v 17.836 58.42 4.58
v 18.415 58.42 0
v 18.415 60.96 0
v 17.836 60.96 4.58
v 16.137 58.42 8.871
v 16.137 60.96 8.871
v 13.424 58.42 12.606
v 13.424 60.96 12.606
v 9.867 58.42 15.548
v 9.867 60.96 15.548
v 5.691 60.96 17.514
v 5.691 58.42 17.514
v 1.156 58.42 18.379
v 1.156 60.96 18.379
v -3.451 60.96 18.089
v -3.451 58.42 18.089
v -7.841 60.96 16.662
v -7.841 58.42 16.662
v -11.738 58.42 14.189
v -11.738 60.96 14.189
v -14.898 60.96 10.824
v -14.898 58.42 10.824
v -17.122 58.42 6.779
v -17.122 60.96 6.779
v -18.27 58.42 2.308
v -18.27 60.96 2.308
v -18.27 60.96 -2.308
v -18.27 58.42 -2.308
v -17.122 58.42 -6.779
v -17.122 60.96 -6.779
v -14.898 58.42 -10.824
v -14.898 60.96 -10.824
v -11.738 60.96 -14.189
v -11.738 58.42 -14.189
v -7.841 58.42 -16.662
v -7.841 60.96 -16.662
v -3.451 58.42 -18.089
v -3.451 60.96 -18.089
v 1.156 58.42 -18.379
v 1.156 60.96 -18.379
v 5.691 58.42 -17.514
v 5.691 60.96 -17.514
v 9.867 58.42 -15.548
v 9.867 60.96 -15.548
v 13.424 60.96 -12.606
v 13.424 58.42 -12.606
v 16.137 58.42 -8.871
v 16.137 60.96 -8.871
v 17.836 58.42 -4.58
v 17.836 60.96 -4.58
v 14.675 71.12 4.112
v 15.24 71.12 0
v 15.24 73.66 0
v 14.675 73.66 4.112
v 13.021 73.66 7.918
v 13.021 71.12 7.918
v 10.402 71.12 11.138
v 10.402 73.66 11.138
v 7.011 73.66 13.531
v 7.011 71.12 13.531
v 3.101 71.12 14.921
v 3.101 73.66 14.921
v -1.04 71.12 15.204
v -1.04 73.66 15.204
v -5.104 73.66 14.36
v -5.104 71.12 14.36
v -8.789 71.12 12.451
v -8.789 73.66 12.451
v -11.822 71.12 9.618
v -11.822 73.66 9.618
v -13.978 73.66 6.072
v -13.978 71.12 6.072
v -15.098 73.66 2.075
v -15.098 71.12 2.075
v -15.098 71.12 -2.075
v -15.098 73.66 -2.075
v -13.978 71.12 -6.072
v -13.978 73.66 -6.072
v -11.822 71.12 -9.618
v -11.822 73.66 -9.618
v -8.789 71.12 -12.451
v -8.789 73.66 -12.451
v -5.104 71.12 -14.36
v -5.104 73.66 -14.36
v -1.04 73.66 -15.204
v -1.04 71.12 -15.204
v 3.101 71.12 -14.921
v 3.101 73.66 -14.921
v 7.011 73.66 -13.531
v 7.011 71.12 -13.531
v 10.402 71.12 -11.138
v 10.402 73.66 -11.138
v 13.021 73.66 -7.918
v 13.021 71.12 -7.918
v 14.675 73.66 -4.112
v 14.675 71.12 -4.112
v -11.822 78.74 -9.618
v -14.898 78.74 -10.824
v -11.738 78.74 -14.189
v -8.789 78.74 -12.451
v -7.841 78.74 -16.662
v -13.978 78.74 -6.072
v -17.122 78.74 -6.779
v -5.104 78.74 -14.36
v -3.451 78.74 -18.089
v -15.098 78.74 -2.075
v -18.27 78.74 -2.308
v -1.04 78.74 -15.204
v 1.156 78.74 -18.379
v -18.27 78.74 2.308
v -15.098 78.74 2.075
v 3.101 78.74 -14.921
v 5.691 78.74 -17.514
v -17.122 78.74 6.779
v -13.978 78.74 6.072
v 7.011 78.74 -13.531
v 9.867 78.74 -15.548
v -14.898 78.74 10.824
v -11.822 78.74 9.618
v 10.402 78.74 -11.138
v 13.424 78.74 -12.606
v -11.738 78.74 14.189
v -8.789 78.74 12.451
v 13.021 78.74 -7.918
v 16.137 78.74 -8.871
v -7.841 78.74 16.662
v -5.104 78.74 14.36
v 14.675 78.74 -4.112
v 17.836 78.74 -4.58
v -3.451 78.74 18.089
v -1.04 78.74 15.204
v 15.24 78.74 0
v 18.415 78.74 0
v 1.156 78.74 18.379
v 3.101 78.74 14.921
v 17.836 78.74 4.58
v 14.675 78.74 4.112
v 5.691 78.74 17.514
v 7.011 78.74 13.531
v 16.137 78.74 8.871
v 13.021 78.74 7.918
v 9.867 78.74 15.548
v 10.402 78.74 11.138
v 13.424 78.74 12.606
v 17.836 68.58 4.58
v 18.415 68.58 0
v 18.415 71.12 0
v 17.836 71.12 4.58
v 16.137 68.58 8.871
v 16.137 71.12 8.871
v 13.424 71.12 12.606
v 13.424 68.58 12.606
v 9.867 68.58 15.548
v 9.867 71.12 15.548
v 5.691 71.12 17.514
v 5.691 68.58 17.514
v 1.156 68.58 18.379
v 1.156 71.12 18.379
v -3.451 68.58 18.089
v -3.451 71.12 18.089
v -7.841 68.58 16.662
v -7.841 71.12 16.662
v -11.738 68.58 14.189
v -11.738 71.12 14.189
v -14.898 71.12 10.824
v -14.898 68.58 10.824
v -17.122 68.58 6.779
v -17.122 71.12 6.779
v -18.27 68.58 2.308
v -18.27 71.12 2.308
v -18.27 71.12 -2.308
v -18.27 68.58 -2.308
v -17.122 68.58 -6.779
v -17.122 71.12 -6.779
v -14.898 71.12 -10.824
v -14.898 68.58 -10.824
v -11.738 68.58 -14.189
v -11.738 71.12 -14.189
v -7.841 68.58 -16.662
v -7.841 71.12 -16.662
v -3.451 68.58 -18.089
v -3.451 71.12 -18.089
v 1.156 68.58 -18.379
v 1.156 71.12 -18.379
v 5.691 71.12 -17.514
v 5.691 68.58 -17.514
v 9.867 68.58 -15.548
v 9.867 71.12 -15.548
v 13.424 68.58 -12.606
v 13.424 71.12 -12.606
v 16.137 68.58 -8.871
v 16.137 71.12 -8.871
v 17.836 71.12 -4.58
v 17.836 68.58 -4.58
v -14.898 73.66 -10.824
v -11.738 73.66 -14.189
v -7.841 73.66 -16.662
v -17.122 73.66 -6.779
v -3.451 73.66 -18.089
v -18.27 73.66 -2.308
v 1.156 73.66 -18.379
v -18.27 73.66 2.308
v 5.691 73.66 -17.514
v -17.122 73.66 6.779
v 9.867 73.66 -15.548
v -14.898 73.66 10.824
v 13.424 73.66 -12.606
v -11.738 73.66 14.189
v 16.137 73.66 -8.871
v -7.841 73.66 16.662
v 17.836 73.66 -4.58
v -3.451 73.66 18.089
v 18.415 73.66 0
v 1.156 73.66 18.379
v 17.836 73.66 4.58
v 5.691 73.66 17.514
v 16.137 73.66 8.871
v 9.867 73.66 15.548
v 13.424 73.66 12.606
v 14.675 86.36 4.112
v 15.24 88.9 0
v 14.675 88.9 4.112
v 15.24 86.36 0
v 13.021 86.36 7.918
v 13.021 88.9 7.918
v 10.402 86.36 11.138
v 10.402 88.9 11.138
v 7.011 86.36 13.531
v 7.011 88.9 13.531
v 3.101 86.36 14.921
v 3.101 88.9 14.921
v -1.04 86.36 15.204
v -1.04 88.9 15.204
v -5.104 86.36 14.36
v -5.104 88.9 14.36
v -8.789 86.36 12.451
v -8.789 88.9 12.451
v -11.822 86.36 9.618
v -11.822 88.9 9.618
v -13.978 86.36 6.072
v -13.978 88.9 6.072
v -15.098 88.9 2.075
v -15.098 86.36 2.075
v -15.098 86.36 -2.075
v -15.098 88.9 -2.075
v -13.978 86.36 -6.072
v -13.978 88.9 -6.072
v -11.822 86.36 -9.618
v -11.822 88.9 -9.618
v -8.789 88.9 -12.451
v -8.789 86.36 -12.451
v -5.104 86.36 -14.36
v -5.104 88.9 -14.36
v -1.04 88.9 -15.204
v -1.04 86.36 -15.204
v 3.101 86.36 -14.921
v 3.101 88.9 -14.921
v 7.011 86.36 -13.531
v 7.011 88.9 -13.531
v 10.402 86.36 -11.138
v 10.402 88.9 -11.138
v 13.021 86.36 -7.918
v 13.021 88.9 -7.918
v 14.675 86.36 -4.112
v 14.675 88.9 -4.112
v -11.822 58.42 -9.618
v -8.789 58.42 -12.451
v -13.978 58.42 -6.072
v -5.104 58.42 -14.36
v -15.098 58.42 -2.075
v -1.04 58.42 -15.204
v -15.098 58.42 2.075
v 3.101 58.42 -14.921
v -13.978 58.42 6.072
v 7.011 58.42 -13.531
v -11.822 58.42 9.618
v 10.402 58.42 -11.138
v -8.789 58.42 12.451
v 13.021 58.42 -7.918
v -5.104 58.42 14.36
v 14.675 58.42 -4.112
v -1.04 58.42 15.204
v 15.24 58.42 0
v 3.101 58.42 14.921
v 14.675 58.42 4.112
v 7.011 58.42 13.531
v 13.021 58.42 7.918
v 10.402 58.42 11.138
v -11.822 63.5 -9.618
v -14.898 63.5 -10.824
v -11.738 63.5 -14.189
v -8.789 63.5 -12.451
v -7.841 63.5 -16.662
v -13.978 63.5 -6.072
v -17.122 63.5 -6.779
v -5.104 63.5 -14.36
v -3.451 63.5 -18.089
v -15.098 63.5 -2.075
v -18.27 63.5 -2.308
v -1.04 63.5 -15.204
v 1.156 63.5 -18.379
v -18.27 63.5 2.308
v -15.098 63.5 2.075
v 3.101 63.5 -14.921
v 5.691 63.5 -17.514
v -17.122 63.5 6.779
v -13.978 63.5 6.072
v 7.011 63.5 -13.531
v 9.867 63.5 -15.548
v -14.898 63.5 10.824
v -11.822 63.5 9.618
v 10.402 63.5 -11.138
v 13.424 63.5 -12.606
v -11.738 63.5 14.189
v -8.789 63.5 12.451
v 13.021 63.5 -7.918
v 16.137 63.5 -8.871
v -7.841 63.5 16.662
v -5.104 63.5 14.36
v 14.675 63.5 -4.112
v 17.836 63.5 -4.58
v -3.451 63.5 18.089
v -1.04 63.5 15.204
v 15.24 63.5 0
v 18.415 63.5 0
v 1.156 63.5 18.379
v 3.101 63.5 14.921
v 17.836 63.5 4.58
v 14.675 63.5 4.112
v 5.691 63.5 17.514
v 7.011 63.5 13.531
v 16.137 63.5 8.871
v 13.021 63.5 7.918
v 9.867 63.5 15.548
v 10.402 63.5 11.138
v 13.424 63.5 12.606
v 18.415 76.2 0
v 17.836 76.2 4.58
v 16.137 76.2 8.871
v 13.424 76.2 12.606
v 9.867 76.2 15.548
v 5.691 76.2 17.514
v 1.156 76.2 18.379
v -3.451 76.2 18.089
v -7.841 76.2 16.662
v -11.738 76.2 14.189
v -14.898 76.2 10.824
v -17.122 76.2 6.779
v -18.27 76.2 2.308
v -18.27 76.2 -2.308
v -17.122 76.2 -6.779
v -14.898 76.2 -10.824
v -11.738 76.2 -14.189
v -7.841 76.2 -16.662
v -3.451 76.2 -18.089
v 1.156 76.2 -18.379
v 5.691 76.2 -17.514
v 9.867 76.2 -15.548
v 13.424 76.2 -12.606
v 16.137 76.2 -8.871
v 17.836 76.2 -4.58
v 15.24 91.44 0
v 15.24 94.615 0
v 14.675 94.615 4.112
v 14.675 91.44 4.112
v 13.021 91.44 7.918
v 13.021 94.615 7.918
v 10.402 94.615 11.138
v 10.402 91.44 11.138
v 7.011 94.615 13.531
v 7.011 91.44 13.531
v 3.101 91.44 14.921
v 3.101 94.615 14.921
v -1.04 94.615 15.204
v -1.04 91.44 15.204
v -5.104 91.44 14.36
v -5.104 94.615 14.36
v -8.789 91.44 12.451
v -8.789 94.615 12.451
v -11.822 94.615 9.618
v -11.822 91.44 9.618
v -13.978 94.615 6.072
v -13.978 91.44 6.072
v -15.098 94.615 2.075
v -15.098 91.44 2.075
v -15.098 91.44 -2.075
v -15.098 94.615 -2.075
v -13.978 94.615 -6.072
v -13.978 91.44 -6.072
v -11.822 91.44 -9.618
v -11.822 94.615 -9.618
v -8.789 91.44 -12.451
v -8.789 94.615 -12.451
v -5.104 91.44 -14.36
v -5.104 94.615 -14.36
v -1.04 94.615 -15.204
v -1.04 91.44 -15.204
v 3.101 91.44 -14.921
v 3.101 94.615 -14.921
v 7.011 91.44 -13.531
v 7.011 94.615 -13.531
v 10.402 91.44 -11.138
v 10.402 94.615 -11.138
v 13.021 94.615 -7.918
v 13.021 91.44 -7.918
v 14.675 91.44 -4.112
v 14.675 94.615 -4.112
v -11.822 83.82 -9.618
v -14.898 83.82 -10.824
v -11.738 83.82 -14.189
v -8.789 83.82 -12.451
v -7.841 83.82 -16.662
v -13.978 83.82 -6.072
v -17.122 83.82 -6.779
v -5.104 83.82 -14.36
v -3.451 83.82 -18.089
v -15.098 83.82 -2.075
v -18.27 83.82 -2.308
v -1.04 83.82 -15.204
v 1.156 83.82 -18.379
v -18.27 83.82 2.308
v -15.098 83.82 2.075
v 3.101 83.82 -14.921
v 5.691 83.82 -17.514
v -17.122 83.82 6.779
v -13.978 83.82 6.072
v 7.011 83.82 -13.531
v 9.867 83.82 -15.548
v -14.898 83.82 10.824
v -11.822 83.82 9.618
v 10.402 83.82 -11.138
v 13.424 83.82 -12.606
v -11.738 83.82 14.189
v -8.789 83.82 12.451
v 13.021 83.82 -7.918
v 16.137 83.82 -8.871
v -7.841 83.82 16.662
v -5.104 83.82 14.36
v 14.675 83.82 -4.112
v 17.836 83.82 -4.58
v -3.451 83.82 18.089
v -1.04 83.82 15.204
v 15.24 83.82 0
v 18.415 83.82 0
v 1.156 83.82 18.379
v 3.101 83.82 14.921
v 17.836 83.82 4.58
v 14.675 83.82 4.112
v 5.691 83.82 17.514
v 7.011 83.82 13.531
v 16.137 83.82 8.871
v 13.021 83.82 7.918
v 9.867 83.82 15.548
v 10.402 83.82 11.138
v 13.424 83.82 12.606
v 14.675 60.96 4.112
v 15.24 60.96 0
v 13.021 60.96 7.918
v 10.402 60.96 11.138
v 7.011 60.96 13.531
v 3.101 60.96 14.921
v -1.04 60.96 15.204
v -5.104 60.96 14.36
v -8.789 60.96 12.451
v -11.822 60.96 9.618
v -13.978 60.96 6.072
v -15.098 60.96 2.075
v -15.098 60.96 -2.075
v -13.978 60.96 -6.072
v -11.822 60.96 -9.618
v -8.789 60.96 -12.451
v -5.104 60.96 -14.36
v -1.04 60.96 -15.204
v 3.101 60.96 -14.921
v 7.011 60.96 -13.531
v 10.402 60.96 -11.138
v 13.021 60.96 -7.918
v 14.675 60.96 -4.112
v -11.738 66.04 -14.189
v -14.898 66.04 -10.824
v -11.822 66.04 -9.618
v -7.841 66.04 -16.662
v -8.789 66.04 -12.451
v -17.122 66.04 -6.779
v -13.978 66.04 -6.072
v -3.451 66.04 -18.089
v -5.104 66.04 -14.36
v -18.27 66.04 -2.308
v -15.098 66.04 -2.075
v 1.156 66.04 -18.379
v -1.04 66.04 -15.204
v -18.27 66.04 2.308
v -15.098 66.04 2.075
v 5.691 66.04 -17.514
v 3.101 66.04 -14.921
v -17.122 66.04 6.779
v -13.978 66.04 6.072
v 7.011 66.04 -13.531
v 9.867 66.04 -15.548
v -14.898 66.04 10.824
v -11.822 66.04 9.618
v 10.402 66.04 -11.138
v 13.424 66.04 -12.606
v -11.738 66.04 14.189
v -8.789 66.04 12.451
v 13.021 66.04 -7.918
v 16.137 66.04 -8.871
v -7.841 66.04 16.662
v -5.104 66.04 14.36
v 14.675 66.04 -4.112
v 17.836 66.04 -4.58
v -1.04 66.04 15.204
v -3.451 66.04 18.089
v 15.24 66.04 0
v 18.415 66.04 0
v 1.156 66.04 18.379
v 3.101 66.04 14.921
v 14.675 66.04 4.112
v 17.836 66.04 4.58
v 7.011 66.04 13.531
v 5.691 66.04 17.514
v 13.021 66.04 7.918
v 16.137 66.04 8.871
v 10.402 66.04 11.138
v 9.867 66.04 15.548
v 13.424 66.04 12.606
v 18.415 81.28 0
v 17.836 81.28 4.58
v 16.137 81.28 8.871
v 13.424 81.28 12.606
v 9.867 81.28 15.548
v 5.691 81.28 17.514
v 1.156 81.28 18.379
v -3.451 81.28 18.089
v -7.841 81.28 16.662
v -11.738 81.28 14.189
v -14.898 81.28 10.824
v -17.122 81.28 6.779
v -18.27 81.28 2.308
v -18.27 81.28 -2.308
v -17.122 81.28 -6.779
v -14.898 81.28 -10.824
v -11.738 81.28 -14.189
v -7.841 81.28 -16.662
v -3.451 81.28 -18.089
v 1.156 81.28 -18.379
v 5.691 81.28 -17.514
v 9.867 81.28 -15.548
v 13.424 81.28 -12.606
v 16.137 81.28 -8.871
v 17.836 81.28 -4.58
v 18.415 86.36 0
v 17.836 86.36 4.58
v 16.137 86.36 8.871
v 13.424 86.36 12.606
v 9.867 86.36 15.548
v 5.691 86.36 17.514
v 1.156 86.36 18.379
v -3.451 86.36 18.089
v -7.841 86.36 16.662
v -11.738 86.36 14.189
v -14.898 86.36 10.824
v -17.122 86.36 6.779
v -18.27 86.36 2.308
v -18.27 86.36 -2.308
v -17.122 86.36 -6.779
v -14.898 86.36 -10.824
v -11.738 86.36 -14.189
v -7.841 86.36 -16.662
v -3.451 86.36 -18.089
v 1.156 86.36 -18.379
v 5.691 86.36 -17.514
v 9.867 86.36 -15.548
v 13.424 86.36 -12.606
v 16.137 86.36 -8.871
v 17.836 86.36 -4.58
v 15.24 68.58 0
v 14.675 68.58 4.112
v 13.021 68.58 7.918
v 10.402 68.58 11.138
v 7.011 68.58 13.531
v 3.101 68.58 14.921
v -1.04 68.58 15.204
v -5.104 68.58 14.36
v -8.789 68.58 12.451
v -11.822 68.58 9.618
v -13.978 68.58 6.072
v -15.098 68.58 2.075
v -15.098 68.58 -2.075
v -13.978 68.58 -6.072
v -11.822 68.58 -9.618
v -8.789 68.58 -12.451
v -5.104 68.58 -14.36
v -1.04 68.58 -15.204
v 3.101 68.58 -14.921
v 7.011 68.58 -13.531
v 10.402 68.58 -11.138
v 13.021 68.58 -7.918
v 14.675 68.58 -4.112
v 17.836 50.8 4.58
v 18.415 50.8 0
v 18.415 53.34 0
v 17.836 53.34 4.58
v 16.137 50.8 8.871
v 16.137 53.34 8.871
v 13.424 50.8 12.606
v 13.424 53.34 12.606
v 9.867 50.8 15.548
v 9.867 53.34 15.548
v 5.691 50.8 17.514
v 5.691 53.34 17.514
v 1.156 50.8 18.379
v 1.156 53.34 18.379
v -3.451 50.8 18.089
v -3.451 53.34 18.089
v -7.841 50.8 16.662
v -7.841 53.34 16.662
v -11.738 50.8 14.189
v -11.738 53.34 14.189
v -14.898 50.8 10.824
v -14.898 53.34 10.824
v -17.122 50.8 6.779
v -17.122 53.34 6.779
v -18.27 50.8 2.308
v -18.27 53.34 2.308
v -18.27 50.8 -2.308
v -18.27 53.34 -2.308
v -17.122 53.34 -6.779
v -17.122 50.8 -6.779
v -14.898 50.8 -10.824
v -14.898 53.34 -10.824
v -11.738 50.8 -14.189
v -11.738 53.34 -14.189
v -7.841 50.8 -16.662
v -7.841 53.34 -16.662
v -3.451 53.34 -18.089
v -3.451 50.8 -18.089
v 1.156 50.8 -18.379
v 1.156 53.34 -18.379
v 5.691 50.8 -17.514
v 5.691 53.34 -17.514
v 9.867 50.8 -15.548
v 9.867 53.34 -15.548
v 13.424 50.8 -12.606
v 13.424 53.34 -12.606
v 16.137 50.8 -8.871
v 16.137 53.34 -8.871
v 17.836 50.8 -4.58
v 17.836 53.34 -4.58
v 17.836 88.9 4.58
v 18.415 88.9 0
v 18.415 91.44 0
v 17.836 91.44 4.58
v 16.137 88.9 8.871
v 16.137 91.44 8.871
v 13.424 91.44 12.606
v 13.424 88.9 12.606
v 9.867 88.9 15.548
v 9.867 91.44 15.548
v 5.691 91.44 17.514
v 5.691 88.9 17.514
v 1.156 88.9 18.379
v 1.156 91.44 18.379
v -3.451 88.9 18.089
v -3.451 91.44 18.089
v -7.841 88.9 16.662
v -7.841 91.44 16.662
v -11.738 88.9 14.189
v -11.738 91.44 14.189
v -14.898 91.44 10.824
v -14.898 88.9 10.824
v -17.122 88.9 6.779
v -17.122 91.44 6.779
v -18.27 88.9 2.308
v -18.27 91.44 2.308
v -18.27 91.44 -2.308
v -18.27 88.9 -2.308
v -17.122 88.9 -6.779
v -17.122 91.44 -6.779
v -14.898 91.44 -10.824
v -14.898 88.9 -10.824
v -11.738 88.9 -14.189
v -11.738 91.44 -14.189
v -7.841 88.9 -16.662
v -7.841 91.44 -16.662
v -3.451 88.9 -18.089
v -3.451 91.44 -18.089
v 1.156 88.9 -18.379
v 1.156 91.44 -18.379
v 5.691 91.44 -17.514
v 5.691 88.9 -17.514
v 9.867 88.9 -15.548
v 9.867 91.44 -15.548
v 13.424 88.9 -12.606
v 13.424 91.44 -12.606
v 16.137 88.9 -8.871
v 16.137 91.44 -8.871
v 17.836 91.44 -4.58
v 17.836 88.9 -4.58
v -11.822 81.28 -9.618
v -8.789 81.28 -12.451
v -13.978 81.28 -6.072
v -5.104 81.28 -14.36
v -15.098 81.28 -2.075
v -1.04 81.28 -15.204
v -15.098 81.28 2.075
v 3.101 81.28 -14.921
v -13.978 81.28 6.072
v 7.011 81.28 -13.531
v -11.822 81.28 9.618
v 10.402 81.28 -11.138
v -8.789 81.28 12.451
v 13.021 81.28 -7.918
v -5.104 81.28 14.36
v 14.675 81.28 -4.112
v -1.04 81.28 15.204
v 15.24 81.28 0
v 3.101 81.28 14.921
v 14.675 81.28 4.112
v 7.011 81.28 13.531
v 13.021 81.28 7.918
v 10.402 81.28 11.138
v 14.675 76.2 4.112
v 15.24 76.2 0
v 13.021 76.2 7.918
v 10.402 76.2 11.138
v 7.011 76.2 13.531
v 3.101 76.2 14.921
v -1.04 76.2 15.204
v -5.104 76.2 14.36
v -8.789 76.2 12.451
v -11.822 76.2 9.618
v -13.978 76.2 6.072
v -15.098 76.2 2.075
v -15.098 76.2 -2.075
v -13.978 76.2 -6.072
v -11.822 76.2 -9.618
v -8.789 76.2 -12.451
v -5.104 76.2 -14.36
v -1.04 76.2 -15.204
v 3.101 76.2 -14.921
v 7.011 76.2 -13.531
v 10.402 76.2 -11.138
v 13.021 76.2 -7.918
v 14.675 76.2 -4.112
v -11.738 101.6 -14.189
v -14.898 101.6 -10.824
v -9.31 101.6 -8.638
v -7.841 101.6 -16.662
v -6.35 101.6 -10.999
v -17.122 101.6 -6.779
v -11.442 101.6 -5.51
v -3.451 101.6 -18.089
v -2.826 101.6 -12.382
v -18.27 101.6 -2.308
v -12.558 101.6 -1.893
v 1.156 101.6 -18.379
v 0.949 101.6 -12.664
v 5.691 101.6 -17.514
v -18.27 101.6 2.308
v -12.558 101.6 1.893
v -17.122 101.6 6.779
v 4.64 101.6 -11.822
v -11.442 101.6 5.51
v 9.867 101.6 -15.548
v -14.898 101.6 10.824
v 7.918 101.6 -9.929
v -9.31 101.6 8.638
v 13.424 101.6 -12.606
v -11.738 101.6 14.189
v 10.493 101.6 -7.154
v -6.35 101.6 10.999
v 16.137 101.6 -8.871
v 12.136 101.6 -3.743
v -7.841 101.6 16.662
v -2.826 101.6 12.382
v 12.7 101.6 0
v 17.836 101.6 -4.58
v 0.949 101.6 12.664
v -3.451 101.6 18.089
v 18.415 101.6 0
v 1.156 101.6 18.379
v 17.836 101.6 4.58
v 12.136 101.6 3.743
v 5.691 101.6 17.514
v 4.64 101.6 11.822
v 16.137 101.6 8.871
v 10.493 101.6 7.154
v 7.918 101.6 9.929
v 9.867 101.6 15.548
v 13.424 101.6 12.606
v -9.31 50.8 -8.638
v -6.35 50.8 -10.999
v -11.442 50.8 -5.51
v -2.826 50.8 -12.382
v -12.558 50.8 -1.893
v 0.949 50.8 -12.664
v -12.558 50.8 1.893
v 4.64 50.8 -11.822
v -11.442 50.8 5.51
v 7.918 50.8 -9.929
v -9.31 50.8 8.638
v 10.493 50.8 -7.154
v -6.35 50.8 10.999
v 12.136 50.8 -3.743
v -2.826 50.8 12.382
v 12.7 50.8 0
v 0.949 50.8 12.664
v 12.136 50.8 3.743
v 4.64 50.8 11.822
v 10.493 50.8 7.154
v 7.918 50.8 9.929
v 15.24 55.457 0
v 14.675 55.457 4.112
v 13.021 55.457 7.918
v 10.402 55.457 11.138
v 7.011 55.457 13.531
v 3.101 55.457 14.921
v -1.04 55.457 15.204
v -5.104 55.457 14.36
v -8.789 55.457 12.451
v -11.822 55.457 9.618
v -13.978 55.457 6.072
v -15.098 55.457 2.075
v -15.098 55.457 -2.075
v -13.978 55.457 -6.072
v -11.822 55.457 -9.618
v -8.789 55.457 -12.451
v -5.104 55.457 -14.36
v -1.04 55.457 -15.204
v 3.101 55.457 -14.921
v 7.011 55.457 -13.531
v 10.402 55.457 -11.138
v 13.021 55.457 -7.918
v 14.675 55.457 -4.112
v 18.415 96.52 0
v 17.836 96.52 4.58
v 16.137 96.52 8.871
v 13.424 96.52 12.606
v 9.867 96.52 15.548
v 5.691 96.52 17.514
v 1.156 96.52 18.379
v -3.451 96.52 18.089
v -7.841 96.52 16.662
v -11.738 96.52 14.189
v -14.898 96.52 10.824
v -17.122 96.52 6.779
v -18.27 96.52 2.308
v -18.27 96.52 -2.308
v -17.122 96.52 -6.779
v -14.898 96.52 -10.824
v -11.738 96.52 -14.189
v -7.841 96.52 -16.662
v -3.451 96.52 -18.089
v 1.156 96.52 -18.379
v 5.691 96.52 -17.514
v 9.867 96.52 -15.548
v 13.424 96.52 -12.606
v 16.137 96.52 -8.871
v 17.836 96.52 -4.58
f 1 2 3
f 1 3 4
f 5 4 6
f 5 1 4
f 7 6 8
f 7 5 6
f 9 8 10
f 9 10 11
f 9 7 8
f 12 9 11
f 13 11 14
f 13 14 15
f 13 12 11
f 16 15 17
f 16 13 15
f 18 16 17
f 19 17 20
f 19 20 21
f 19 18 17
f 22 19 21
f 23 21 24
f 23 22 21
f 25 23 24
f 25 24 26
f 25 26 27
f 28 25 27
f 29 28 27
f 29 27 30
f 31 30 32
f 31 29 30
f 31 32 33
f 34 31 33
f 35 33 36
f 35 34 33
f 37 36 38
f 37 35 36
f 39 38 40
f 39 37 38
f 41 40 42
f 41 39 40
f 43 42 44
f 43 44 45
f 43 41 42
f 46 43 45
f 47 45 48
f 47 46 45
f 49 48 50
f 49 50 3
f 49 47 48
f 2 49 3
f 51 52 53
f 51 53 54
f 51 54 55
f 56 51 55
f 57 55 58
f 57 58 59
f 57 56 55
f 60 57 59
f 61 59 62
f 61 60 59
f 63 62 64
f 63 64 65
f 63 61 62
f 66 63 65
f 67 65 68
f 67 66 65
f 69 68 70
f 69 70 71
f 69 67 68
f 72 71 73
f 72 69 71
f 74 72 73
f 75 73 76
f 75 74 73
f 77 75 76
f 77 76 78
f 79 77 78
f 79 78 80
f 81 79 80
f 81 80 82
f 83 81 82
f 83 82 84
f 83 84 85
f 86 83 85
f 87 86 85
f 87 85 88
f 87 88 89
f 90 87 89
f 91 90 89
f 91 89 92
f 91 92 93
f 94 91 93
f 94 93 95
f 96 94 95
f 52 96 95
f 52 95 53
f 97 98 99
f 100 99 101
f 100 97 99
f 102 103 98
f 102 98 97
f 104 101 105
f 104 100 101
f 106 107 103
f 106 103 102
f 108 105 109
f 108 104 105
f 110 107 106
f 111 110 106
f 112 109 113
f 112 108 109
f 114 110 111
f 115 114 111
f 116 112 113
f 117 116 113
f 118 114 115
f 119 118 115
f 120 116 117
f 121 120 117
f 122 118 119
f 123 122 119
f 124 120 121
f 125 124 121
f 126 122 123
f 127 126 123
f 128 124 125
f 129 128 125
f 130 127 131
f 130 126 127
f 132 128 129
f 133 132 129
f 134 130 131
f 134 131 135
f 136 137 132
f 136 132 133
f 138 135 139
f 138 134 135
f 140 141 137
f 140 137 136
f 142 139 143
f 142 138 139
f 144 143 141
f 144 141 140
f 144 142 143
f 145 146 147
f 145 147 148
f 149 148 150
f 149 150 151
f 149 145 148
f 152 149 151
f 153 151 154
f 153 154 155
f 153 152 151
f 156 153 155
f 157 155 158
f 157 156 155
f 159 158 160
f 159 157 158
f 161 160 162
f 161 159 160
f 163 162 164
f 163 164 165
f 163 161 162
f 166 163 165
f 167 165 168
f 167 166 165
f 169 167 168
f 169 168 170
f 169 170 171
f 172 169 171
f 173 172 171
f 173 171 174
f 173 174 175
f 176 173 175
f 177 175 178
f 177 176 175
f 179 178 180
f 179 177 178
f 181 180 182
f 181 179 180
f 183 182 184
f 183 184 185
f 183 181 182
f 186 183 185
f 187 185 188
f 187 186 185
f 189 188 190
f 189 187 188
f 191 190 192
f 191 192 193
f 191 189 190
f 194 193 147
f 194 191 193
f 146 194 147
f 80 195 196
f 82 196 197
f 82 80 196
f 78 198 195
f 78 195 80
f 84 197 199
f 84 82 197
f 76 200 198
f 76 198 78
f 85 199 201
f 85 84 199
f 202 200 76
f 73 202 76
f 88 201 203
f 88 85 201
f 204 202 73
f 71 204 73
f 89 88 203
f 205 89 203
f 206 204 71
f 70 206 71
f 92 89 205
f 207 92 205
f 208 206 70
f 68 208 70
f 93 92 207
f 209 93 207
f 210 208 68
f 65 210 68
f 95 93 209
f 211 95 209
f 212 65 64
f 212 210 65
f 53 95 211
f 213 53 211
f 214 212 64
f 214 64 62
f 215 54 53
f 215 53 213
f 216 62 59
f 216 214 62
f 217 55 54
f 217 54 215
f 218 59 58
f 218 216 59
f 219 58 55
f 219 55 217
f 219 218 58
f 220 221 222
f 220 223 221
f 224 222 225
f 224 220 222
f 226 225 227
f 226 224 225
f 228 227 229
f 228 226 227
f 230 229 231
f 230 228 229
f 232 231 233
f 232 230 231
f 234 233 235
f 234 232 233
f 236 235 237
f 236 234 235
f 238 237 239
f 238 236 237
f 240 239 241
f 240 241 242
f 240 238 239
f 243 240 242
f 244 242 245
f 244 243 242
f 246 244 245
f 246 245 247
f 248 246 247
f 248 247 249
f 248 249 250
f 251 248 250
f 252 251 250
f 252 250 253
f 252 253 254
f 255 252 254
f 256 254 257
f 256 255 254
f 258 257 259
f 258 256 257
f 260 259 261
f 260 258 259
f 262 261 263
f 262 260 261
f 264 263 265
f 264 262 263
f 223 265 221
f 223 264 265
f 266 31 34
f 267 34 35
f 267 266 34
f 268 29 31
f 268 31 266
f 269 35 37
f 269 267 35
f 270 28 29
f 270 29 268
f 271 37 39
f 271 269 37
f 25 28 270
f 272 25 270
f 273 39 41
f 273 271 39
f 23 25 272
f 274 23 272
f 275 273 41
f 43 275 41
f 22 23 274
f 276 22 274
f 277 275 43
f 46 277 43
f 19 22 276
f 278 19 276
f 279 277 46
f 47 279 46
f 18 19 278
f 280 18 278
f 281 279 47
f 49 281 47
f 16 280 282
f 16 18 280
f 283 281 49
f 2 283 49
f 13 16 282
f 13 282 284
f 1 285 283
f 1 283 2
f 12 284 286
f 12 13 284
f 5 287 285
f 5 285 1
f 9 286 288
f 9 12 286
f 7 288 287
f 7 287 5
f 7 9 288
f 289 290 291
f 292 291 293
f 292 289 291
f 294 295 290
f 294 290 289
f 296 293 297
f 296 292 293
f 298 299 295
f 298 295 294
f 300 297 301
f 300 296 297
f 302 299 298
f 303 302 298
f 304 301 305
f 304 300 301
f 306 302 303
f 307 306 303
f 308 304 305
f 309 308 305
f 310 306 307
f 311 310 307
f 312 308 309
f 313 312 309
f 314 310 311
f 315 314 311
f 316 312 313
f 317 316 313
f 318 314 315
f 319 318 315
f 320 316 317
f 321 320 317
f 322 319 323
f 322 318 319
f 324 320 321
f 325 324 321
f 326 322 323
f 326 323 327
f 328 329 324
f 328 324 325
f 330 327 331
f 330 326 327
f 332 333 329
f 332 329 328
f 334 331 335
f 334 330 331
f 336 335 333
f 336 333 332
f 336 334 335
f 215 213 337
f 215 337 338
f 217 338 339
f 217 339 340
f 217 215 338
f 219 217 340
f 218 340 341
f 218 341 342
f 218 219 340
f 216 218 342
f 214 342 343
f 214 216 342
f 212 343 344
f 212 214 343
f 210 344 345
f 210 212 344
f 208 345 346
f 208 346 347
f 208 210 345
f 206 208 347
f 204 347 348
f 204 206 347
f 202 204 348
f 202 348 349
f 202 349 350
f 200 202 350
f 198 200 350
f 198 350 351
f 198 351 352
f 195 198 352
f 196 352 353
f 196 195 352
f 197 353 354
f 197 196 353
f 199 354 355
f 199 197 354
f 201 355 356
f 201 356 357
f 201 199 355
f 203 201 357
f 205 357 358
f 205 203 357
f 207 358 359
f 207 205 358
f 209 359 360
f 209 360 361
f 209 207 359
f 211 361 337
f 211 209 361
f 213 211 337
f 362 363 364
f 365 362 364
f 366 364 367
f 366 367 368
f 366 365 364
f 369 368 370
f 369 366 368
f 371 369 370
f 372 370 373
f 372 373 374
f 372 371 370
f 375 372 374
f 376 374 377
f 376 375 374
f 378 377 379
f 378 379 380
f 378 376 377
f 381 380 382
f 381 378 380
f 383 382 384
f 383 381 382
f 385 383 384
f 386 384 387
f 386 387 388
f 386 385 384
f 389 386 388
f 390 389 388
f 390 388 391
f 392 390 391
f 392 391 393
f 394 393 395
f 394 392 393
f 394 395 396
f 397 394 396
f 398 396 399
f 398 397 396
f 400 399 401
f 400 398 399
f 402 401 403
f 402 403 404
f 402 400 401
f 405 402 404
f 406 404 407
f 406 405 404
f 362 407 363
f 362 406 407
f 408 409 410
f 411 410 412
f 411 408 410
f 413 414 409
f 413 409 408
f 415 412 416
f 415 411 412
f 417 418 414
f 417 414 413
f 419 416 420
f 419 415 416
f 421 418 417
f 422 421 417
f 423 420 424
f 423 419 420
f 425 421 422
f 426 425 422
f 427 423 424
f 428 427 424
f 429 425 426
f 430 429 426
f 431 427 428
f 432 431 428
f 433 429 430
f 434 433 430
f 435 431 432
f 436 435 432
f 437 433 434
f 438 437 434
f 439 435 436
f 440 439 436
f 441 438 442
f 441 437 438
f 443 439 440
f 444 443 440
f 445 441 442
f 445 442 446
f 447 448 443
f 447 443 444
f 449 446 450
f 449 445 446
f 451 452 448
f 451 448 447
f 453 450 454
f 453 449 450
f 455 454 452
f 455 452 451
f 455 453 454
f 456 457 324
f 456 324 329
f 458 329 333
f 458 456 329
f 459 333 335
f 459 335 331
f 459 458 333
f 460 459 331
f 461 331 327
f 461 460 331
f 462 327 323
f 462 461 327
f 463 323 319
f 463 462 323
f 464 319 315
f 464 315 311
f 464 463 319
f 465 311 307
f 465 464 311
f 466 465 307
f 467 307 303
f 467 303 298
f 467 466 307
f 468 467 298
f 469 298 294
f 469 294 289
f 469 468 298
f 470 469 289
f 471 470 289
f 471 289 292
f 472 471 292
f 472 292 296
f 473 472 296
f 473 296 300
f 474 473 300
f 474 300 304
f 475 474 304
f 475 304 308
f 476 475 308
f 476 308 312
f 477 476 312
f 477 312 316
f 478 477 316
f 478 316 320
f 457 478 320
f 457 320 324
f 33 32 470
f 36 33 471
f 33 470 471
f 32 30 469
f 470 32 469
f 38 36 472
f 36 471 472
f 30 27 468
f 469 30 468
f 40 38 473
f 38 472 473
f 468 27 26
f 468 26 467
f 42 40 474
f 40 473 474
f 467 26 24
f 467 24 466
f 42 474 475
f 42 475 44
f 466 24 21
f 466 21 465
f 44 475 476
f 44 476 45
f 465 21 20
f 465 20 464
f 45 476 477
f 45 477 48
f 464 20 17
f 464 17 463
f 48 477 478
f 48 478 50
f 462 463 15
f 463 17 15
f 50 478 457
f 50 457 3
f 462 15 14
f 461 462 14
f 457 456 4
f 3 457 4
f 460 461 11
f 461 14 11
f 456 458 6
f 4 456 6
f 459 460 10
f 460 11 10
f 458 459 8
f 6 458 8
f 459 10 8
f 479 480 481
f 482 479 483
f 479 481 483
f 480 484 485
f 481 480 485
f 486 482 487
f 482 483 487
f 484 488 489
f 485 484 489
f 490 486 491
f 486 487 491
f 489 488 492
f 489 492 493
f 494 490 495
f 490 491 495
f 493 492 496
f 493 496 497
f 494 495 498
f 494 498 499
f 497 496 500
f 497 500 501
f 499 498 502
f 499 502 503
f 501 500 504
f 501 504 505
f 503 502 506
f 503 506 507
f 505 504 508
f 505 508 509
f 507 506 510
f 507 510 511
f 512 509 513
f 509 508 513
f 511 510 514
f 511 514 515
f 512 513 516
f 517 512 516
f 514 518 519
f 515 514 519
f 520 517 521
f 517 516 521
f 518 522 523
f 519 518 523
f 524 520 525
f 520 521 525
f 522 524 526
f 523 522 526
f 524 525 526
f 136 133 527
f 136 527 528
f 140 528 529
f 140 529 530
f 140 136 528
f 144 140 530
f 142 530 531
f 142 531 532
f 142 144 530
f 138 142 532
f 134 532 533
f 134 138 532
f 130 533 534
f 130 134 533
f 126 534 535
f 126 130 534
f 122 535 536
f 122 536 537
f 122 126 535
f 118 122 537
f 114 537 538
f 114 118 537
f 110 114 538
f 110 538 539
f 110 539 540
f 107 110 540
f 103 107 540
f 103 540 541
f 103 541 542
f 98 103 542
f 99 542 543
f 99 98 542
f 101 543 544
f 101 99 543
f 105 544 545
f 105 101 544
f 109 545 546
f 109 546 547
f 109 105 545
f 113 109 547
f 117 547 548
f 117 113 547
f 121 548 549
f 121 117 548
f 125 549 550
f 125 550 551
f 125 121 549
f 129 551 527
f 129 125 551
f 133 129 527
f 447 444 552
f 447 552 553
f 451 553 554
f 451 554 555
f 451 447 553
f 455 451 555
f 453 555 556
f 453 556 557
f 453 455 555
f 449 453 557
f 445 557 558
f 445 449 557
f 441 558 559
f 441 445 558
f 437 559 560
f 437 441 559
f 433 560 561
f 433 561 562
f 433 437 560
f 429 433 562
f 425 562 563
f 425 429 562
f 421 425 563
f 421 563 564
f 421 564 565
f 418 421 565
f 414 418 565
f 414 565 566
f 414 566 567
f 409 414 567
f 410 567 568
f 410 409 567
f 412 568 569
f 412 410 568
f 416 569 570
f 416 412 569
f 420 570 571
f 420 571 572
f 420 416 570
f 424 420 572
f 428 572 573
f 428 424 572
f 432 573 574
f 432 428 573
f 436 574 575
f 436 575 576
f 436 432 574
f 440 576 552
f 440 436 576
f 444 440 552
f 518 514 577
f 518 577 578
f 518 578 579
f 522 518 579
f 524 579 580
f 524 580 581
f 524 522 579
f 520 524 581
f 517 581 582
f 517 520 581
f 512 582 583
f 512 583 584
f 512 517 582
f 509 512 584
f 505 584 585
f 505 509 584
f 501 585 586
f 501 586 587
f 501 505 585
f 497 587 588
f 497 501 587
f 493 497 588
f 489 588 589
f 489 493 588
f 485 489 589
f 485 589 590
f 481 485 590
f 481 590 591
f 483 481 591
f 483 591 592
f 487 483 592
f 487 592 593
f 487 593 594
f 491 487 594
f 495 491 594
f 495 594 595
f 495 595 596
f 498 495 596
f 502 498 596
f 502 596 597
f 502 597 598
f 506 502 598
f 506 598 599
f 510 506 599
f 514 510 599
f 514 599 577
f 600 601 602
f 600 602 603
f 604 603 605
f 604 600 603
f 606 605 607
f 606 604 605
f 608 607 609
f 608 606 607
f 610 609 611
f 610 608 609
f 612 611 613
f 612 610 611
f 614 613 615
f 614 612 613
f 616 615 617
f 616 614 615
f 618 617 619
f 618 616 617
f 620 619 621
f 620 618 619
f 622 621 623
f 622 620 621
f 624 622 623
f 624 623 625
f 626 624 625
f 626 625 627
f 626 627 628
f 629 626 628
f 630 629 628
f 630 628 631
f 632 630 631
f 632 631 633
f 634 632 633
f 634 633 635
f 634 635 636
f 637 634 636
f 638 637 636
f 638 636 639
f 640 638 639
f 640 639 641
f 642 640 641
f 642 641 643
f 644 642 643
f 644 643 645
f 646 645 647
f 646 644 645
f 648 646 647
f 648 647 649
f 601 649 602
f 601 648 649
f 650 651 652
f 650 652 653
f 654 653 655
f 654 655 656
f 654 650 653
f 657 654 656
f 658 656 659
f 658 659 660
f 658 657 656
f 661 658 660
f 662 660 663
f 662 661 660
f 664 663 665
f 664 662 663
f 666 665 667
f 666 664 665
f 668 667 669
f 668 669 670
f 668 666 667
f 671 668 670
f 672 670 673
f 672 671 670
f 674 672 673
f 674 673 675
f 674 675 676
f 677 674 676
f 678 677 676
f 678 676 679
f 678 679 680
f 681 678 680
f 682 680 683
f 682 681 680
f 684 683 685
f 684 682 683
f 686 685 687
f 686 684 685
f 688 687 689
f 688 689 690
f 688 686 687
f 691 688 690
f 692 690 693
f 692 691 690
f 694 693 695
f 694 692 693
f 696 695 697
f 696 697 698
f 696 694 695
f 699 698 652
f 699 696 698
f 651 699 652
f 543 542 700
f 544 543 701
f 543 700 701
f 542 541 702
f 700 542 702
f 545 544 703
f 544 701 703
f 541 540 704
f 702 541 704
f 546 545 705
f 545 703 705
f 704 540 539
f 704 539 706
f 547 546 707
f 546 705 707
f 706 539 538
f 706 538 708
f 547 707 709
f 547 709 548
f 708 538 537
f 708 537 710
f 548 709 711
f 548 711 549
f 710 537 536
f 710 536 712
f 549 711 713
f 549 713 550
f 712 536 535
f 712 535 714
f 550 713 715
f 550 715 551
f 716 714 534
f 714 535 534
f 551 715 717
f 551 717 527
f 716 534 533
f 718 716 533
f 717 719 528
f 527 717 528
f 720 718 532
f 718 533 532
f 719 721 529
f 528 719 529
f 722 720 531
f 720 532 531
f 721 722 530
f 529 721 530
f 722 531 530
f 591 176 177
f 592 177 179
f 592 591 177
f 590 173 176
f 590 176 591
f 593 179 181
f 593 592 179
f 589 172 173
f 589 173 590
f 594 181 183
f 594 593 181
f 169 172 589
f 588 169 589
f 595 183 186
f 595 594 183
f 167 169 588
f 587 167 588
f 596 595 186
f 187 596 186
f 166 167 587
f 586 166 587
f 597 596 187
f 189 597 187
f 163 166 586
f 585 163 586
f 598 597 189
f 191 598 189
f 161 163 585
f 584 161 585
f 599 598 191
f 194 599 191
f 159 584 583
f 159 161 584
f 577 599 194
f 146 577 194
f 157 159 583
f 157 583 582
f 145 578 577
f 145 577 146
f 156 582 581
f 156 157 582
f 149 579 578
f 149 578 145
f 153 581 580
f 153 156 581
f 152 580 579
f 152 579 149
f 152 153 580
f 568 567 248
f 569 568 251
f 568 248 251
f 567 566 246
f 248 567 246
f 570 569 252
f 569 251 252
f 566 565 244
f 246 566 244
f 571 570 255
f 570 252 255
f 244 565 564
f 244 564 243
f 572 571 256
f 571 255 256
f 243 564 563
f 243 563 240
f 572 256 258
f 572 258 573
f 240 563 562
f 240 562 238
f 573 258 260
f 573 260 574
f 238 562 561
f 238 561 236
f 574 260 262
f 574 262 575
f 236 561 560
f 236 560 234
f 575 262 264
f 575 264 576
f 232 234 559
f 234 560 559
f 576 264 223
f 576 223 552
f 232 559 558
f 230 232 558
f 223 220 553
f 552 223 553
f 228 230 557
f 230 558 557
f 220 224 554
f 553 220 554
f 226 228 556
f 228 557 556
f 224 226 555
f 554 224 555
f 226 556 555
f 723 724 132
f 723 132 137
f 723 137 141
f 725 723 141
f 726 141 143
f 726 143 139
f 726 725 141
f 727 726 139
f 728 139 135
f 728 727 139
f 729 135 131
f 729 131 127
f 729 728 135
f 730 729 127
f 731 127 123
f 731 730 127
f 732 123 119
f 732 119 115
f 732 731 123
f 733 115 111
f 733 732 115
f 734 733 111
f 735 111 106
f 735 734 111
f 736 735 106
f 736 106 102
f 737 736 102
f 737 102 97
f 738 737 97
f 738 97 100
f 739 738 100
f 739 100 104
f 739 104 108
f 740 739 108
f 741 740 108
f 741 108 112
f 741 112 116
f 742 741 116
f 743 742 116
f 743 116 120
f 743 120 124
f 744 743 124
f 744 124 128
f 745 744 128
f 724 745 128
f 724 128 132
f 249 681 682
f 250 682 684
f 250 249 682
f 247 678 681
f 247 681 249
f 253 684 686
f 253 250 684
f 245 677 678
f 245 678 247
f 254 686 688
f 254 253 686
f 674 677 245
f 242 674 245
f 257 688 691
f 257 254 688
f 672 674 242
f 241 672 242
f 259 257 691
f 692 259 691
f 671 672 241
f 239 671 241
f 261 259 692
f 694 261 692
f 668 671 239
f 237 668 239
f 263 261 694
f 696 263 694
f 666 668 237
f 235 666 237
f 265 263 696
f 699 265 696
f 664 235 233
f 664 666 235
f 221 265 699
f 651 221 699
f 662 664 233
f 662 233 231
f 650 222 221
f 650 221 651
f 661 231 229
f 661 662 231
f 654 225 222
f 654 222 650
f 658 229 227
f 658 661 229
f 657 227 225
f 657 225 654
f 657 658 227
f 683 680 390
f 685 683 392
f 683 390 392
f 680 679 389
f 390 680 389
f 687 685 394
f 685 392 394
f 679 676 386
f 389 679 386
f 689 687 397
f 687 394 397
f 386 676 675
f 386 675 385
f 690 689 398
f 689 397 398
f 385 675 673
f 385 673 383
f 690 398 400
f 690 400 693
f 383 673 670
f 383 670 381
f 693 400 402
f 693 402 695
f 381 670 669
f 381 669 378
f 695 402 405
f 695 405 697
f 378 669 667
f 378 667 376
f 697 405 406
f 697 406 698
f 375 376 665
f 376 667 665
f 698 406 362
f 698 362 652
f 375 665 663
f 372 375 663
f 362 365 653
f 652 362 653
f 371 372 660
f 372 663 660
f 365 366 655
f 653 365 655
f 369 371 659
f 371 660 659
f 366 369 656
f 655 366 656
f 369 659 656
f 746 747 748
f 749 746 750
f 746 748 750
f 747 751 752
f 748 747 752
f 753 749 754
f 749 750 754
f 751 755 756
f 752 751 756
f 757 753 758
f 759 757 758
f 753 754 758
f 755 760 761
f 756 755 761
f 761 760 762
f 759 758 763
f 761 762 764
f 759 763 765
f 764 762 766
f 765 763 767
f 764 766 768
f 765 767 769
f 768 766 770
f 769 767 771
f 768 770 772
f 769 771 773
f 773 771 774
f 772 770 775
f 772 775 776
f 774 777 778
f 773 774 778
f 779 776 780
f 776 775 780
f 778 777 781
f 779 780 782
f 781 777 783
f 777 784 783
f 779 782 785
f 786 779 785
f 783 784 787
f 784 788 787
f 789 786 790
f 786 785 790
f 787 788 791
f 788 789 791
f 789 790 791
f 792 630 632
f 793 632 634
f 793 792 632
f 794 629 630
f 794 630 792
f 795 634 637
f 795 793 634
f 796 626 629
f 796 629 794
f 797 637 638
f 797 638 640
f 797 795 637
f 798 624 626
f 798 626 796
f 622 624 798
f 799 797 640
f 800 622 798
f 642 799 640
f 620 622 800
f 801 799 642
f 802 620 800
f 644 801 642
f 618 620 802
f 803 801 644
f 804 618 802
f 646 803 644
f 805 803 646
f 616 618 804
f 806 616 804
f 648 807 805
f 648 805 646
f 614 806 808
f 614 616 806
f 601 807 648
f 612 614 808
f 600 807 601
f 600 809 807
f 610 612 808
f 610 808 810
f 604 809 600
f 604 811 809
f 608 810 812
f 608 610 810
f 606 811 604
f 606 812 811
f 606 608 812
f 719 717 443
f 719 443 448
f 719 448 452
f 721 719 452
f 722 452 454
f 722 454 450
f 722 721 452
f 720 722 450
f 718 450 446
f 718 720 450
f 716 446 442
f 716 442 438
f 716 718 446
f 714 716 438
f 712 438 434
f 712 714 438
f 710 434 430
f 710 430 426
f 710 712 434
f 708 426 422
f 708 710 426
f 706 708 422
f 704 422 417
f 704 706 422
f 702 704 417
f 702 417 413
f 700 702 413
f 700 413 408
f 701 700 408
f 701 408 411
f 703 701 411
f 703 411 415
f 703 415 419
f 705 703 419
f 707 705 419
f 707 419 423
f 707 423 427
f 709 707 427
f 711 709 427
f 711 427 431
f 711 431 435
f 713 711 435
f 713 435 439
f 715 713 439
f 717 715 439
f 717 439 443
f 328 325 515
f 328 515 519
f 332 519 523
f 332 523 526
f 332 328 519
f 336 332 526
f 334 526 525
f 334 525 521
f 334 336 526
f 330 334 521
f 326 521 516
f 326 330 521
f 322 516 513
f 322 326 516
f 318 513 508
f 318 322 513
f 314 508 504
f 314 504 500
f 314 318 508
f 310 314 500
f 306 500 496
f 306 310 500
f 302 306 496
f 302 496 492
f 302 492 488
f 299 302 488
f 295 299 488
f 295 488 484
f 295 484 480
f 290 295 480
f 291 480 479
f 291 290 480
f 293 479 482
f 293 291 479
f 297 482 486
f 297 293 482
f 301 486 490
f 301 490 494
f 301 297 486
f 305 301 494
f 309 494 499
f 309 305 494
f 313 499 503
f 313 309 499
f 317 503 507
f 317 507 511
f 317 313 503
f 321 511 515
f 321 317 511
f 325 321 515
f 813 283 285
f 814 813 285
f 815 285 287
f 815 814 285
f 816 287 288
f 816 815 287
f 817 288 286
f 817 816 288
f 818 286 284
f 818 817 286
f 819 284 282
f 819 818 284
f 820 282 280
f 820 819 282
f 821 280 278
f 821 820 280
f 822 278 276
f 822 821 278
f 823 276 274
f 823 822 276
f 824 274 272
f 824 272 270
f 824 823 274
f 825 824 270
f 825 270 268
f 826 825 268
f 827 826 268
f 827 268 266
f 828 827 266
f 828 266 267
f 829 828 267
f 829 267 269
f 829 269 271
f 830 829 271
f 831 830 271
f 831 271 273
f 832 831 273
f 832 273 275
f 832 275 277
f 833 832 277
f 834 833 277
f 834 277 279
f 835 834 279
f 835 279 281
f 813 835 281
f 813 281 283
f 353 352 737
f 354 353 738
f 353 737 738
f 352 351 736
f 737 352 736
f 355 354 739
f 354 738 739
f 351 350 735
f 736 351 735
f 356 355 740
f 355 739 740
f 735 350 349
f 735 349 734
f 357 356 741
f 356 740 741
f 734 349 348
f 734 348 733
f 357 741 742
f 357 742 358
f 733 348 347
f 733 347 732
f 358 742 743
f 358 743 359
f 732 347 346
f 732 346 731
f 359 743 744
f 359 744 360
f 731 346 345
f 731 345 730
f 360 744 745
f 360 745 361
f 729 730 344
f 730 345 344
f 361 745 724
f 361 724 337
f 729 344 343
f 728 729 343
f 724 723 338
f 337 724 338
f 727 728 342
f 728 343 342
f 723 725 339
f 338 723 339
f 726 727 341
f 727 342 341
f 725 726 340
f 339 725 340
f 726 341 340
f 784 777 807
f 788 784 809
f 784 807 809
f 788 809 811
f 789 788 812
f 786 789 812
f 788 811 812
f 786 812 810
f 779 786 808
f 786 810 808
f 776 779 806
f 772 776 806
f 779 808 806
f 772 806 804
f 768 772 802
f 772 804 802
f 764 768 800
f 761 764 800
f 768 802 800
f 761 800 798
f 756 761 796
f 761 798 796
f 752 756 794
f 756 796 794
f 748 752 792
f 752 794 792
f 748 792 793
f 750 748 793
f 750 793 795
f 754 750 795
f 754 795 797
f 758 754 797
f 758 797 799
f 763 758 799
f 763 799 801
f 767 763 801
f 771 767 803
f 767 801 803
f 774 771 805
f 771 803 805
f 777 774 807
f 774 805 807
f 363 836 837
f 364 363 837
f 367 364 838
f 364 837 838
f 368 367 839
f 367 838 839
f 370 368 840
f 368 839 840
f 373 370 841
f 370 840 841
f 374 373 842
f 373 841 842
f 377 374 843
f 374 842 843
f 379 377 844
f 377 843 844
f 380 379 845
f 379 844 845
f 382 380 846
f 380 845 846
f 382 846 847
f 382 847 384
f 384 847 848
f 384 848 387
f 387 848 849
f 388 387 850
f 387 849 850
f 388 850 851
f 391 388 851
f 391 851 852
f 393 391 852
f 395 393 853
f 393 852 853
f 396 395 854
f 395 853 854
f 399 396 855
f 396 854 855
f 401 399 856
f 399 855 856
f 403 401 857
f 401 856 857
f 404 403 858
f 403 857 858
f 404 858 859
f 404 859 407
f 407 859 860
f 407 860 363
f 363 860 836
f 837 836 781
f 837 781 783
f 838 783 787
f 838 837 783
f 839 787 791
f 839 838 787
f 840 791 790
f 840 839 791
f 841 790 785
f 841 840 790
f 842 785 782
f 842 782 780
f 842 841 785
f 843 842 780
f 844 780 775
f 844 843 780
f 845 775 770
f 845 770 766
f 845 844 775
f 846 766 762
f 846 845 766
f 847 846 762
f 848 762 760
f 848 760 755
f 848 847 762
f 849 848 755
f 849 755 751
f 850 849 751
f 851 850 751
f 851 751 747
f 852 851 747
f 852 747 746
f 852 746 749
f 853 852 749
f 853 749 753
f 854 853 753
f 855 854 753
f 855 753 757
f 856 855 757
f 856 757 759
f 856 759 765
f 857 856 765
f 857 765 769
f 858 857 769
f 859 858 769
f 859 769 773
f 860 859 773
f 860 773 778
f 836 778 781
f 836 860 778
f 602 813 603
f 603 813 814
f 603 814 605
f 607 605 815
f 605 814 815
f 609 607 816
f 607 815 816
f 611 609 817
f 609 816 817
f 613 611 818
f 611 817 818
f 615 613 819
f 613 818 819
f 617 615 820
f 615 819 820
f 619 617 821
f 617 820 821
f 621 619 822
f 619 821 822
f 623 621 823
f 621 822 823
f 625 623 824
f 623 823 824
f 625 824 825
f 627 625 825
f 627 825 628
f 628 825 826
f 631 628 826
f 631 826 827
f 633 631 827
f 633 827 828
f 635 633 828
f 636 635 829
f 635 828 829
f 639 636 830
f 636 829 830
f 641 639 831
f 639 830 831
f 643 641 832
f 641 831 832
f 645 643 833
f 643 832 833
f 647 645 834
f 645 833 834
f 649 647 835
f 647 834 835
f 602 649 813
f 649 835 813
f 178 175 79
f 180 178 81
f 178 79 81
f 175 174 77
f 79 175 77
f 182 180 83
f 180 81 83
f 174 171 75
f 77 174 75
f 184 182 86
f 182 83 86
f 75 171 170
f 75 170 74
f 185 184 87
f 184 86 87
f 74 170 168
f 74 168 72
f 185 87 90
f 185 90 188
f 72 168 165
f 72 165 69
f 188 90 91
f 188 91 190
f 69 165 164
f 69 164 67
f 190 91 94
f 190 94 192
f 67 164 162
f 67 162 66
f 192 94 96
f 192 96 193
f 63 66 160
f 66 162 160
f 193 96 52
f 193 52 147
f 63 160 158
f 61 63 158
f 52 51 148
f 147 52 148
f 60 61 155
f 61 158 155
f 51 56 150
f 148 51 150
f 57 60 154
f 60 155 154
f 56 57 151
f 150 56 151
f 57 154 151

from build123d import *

# Parameters (mm, degrees)
F1_START     = -88.9
F0_R         = 18.415
F0_R_2       = 12.7
F1_DEPTH     = 12.7
F2_START     = -83.82
F2_DEPTH     = 2.54
F3_START     = -78.74
F3_DEPTH     = 2.54
F4_START     = -73.66
F4_DEPTH     = 2.54
F5_START     = -68.58
F5_DEPTH     = 2.54
F6_START     = -63.5
F6_DEPTH     = 2.54
F7_START     = -58.42
F7_DEPTH     = 2.54
F8_DEPTH     = 55.88
F9_R         = 15.24
F9_R_2       = 12.7
F10_DEPTH    = 101.6
F11_S5_R     = 15.24
F11_T6_DEPTH = 28
F12_S5_R     = 15.24
F12_T6_DEPTH = 53
F13_START    = -88.9
F13_DEPTH    = 2.54
F14_DEPTH    = 50.8


# Not quite as in the source:
# - a fillet or chamfer that OpenCascade refuses, or shapes differently, is made with other operations: its cross-section is extruded or revolved along the edge and cut away or added


with BuildPart() as f1:
    # F0 (on Front) → F1 (new body)
    with BuildSketch(Plane.XZ.offset(F1_START)):
        Circle(F0_R)
        Circle(F0_R_2, mode=Mode.SUBTRACT)
    extrude(amount=-F1_DEPTH)



with BuildPart() as f2:
    # F0 (on Front) → F2 (new body)
    with BuildSketch(Plane.XZ.offset(F2_START)):
        Circle(F0_R)
        Circle(F0_R_2, mode=Mode.SUBTRACT)
    extrude(amount=-F2_DEPTH)


with BuildPart() as f3:
    # F0 (on Front) → F3 (new body)
    with BuildSketch(Plane.XZ.offset(F3_START)):
        Circle(F0_R)
        Circle(F0_R_2, mode=Mode.SUBTRACT)
    extrude(amount=-F3_DEPTH)


with BuildPart() as f4:
    # F0 (on Front) → F4 (new body)
    with BuildSketch(Plane.XZ.offset(F4_START)):
        Circle(F0_R)
        Circle(F0_R_2, mode=Mode.SUBTRACT)
    extrude(amount=-F4_DEPTH)


with BuildPart() as f5:
    # F0 (on Front) → F5 (new body)
    with BuildSketch(Plane.XZ.offset(F5_START)):
        Circle(F0_R)
        Circle(F0_R_2, mode=Mode.SUBTRACT)
    extrude(amount=-F5_DEPTH)


with BuildPart() as f6:
    # F0 (on Front) → F6 (new body)
    with BuildSketch(Plane.XZ.offset(F6_START)):
        Circle(F0_R)
        Circle(F0_R_2, mode=Mode.SUBTRACT)
    extrude(amount=-F6_DEPTH)


with BuildPart() as f7:
    # F0 (on Front) → F7 (new body)
    with BuildSketch(Plane.XZ.offset(F7_START)):
        Circle(F0_R)
        Circle(F0_R_2, mode=Mode.SUBTRACT)
    extrude(amount=-F7_DEPTH)


with BuildPart() as f8:
    # F0 (on Front) → F8 (new body)
    with BuildSketch(Plane.XZ):
        Circle(F0_R)
        Circle(F0_R_2, mode=Mode.SUBTRACT)
    extrude(amount=-F8_DEPTH)


with BuildPart() as f1_1:
    add(f1.part)

    add(f2.part)  # F10 merges F2

    add(f3.part)  # F10 merges F3

    add(f4.part)  # F10 merges F4

    add(f5.part)  # F10 merges F5

    add(f6.part)  # F10 merges F6

    add(f7.part)  # F10 merges F7

    add(f8.part)  # F10 merges F8
    # F9 (on Front) → F10 (join)
    with BuildSketch(Plane.XZ):
        Circle(F9_R)
        Circle(F9_R_2, mode=Mode.SUBTRACT)
    extrude(amount=-F10_DEPTH)

    # F11: chamfer of 2.54 x 3.81 on 1 edges, made by hand


with BuildPart() as f11_tool2:
    # F11_s3 → F11_t4 (revolve)
    with BuildSketch(Plane.XY):
        Polygon((18.415, 53.34), (14.605, 55.88), (18.415, 55.88), align=None)
    revolve(axis=Axis((0, 55.88, 0), (0, -1, 0)))

    # F11_s5 → F11_t6 (cut, symmetric)
    with BuildSketch(Plane.XZ.offset(-54.6)):
        Circle(F11_S5_R)
    extrude(amount=F11_T6_DEPTH, both=True, mode=Mode.SUBTRACT)


with BuildPart() as f1_2:
    add(f1_1.part)

    # F11_t1: cut F11_tool2
    add(f11_tool2.part, mode=Mode.SUBTRACT)

    # F12: chamfer of 12.7 x 7.62 on 1 edges, made by hand


with BuildPart() as f12_tool2:
    # F12_s3 → F12_t4 (revolve)
    with BuildSketch(Plane.XY):
        with BuildLine():
            Line((5.2793935937, 88.6386361562), (18.8506064063, 96.7813638438))
            Line((18.8506064063, 96.7813638438), (19.1046064063, 96.7813638438))
            ThreePointArc((19.1046064063, 96.7813638438), (18.669, 92.8406819219), (18.669, 88.9))
            Line((18.669, 88.9), (18.415, 88.646))
            ThreePointArc((18.415, 88.646), (11.8471967969, 88.646), (5.2793935937, 88.3846361562))
            Line((5.2793935937, 88.3846361562), (5.2793935937, 88.6386361562))
        make_face()
    revolve(axis=Axis((0, 88.9, 0), (0, -1, 0)))

    # F12_s5 → F12_t6 (cut, symmetric)
    with BuildSketch(Plane.XZ.offset(-90.9)):
        Circle(F12_S5_R)
    extrude(amount=F12_T6_DEPTH, both=True, mode=Mode.SUBTRACT)


with BuildPart() as f1_3:
    add(f1_2.part)

    # F12_t1: cut F12_tool2
    add(f12_tool2.part, mode=Mode.SUBTRACT)

    # F0 (on Front) → F13 (join)
    with BuildSketch(Plane.XZ.offset(F13_START)):
        Circle(F0_R)
        Circle(F0_R_2, mode=Mode.SUBTRACT)
    extrude(amount=-F13_DEPTH)

    # F0 (on Front) → F14 (cut)
    with BuildSketch(Plane.XZ):
        Circle(F0_R)
        Circle(F0_R_2, mode=Mode.SUBTRACT)
    extrude(amount=-F14_DEPTH, mode=Mode.SUBTRACT)


solid = f1_3.part
